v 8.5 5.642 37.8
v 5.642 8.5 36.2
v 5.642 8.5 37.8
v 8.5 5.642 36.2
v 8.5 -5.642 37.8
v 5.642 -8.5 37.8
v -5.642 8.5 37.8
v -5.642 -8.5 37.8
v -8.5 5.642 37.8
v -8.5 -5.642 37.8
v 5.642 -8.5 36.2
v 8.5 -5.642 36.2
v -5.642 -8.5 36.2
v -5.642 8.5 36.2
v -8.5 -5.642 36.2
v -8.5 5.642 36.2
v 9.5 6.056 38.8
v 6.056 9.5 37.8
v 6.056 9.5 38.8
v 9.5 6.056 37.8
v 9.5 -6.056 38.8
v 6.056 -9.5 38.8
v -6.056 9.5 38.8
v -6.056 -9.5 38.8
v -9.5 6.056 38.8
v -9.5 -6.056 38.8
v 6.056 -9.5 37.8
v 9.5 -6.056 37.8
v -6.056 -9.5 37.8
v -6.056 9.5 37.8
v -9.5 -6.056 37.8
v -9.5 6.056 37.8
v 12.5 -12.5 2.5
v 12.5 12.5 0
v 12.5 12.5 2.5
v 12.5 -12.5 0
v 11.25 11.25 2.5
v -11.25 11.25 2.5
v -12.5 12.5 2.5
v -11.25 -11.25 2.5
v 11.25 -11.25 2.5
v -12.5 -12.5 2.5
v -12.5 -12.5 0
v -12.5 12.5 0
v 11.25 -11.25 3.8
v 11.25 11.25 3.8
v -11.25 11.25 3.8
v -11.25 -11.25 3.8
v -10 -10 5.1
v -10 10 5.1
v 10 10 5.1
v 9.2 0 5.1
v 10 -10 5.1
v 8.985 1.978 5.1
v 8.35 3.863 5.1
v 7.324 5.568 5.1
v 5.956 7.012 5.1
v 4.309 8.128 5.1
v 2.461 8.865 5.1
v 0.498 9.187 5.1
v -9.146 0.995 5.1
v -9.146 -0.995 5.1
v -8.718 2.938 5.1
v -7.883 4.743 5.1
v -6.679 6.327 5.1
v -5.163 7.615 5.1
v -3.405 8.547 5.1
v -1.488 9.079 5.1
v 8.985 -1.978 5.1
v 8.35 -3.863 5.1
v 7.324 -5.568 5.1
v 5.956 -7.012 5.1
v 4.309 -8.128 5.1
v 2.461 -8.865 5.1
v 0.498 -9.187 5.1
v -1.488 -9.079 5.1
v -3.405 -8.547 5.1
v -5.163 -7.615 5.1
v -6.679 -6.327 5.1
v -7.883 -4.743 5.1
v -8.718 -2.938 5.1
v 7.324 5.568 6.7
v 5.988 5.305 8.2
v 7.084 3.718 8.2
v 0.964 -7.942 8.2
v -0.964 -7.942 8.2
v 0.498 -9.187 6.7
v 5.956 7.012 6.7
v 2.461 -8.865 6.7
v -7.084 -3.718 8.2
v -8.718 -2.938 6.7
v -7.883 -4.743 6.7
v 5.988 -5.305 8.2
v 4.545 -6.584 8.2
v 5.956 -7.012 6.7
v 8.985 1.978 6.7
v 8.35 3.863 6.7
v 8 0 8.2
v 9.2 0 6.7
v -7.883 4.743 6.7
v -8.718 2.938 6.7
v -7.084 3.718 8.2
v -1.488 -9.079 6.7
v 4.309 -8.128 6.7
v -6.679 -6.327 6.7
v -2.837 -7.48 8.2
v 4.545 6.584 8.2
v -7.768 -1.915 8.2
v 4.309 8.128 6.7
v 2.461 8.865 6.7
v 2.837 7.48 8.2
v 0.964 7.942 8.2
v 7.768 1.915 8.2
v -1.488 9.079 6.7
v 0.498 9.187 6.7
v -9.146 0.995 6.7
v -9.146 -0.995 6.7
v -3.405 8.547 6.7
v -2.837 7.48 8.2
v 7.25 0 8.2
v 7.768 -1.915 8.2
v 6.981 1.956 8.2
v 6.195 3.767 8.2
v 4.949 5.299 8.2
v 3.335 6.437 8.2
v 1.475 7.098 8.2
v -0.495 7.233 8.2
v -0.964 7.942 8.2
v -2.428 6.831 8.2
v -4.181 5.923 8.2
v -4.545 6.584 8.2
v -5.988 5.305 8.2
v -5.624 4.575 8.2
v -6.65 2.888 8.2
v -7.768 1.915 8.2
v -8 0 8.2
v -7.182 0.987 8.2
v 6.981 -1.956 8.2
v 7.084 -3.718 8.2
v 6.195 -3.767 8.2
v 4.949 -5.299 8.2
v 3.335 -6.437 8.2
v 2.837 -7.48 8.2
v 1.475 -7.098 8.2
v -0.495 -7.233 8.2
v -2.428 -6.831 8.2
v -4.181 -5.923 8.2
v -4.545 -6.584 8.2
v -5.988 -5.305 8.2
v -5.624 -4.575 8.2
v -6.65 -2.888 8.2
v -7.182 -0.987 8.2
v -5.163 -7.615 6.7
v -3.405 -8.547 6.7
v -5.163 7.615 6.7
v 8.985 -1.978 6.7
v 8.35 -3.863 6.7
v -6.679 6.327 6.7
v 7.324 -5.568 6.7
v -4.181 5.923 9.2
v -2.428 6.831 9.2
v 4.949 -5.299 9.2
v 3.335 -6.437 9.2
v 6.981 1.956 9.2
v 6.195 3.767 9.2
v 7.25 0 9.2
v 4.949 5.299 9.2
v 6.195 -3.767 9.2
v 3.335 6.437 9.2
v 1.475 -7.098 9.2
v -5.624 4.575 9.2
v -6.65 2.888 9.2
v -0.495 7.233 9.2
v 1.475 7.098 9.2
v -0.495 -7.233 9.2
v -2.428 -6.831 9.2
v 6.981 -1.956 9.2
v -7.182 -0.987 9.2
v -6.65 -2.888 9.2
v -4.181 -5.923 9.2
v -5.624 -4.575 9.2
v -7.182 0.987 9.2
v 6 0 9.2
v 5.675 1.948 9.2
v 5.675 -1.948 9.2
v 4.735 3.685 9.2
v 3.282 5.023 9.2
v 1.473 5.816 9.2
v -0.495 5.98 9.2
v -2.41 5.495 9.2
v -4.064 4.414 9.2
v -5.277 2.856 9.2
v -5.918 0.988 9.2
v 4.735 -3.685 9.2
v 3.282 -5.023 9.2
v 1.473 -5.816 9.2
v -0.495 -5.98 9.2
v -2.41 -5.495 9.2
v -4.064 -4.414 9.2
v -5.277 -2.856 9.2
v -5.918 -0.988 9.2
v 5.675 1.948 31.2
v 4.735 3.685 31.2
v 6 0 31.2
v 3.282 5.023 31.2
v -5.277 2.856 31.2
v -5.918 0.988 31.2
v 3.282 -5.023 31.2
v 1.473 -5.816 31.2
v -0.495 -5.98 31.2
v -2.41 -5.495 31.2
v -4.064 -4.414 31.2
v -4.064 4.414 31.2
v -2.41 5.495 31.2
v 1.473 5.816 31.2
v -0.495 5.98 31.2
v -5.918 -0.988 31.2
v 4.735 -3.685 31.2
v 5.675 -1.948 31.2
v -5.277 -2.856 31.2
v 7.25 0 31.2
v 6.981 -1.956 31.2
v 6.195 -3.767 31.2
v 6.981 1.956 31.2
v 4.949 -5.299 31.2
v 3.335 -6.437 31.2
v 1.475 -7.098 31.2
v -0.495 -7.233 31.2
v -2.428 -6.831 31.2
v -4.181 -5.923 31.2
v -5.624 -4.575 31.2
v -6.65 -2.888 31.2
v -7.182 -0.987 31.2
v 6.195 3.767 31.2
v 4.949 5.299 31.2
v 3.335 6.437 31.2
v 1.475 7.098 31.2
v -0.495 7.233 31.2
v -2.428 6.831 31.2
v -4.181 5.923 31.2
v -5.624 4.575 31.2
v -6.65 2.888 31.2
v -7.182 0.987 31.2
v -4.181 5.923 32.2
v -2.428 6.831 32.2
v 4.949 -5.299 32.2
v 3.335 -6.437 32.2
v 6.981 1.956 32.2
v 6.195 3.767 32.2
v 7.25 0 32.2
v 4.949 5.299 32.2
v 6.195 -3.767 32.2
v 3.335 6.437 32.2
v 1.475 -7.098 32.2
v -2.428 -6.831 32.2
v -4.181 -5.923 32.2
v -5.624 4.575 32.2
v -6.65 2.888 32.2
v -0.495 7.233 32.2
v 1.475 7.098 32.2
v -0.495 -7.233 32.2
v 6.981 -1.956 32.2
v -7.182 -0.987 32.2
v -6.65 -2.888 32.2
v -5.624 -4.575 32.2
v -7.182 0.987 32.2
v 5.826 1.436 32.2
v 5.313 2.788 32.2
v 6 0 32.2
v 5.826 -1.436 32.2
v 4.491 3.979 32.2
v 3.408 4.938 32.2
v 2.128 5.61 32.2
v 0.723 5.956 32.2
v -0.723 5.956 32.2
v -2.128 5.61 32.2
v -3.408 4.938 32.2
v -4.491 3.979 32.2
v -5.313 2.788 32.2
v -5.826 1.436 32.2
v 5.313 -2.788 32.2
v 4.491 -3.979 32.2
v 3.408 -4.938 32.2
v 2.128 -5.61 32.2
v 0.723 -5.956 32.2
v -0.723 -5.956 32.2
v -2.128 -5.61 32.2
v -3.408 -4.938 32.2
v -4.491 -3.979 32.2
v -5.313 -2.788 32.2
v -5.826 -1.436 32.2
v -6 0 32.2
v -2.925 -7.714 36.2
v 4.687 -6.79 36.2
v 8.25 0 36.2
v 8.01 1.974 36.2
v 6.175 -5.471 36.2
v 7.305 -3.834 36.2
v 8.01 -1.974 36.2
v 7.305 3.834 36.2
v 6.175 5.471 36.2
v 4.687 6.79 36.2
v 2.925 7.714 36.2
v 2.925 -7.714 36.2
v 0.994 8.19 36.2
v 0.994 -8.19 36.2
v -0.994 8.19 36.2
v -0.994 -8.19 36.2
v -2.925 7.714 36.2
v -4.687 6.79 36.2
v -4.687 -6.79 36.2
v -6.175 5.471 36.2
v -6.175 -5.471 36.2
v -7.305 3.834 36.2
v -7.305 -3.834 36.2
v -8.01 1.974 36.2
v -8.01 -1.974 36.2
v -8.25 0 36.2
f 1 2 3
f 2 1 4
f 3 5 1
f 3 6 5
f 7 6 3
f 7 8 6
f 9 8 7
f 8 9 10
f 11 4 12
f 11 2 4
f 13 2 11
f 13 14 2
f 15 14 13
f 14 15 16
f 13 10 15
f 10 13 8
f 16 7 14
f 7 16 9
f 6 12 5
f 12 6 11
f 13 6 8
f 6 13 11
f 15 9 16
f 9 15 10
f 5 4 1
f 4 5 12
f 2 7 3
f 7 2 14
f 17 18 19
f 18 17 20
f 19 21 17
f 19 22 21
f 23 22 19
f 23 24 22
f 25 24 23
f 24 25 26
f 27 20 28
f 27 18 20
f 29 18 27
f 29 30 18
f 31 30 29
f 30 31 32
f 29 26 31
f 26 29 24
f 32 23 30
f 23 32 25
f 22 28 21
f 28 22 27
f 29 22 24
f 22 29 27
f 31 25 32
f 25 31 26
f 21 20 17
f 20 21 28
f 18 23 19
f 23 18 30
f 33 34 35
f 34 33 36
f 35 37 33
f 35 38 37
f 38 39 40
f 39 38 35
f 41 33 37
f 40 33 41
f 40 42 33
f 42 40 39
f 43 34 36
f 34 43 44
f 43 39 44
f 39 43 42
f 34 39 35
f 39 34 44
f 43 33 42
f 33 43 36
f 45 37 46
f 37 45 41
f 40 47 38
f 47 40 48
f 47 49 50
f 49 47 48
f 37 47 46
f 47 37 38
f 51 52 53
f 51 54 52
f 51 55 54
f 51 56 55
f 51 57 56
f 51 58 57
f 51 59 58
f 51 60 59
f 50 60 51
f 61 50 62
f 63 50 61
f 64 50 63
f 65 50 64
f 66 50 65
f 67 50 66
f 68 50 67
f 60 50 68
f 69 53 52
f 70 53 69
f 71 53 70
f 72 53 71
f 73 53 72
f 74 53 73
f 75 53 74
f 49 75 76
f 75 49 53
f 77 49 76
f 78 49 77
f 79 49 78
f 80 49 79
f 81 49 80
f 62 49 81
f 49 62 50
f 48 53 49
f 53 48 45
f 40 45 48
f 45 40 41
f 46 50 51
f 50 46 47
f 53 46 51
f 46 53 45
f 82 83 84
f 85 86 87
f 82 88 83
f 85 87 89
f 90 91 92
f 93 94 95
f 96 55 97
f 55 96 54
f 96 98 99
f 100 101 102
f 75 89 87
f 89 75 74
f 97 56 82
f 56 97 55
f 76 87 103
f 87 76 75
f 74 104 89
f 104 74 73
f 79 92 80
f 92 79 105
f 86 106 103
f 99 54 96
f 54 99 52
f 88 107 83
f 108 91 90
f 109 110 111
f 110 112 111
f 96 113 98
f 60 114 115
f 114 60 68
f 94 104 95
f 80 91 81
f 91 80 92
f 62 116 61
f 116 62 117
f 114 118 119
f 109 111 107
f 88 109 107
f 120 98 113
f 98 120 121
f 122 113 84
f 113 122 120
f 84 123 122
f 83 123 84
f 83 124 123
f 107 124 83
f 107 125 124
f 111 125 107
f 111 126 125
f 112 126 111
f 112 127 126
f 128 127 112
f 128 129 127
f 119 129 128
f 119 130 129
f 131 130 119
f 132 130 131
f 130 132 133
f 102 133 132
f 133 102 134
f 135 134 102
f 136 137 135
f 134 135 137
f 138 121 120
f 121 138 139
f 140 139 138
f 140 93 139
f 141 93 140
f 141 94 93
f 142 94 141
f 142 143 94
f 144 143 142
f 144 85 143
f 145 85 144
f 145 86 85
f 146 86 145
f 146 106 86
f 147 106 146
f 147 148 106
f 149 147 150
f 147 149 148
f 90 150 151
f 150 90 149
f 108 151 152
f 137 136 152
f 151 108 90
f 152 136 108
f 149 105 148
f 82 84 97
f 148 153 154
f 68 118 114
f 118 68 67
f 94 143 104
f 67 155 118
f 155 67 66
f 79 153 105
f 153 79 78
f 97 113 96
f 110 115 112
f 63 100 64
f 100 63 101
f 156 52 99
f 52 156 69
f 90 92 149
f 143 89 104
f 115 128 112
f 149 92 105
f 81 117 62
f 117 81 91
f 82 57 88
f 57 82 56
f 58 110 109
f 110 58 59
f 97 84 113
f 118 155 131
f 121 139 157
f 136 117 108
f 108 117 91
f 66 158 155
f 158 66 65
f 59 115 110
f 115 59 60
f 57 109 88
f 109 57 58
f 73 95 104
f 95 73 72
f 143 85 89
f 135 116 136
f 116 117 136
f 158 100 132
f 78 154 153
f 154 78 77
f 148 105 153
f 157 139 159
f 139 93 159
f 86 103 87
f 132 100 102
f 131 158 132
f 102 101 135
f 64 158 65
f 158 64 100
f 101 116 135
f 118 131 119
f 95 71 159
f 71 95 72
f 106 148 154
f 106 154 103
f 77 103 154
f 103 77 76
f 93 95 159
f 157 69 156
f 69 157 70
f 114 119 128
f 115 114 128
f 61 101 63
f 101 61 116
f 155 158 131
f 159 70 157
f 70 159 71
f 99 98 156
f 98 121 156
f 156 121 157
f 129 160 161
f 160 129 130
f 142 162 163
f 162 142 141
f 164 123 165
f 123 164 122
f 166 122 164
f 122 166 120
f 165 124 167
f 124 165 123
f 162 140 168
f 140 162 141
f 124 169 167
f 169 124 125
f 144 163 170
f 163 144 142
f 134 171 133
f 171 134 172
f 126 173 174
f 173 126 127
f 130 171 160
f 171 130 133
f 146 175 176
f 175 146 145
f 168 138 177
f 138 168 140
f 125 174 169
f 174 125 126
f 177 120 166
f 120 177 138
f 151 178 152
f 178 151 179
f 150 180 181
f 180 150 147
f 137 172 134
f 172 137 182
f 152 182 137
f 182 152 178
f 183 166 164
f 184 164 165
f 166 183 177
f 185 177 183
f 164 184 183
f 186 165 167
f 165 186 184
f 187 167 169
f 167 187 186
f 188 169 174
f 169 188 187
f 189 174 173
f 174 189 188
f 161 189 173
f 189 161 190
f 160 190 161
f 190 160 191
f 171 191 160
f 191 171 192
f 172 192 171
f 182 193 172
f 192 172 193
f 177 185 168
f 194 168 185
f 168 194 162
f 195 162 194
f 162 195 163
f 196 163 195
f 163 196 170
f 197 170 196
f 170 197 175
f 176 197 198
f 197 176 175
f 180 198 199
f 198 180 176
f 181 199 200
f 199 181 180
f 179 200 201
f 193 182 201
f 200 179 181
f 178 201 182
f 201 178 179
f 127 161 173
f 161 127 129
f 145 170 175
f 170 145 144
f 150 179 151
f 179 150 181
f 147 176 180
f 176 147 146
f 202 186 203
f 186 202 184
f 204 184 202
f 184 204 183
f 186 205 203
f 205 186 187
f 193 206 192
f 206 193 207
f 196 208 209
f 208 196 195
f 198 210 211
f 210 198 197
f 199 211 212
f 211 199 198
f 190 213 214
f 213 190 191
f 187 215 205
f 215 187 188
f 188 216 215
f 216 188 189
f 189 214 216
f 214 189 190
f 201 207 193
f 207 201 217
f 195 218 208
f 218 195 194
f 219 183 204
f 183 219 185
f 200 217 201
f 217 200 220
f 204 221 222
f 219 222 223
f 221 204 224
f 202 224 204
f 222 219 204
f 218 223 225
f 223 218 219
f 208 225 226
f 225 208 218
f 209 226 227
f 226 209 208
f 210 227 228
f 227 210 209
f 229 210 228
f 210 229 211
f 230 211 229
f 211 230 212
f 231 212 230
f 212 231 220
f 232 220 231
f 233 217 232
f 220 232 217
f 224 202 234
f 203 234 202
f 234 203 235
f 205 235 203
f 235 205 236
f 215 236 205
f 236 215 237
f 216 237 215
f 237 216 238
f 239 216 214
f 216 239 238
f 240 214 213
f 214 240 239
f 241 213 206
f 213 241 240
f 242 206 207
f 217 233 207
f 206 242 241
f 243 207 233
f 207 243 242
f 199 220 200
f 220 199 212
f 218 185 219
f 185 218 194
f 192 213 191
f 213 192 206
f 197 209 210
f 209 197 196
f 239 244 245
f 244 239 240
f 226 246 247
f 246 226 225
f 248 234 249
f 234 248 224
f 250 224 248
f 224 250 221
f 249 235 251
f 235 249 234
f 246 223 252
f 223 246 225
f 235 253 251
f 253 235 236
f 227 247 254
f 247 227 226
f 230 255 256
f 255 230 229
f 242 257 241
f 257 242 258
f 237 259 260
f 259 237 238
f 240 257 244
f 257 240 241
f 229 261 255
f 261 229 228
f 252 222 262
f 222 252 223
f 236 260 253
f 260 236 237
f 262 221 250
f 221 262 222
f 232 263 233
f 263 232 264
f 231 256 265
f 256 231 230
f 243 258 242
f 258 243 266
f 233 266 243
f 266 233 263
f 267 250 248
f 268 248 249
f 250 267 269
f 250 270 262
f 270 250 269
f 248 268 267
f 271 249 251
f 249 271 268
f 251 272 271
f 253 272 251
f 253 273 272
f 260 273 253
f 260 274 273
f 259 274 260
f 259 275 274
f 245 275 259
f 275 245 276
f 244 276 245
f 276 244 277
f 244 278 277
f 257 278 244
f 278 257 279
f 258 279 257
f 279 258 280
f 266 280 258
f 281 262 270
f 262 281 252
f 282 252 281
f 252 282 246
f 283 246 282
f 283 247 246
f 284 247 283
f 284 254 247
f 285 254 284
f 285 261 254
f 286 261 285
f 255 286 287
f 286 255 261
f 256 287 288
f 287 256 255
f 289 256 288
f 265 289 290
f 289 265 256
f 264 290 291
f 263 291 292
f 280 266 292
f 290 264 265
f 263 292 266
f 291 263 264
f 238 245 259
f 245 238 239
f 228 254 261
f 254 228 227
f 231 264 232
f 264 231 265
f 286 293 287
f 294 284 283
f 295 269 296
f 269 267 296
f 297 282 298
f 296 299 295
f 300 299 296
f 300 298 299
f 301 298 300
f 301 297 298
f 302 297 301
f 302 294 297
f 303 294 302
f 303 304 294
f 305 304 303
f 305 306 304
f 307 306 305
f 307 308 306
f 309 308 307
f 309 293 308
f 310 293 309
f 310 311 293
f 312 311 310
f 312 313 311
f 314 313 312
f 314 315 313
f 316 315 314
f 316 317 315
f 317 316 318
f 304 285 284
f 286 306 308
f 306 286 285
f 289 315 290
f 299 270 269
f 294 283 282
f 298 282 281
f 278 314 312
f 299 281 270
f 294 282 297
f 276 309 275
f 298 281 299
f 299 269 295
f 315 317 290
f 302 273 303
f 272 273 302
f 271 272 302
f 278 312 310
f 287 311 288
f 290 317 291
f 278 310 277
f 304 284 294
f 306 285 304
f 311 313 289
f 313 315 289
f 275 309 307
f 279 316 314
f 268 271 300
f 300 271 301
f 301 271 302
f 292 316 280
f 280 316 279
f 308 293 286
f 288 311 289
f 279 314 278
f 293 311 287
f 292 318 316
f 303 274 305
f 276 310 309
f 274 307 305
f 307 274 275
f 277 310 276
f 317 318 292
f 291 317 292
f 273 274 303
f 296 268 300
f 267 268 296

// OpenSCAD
union() {
  translate([-12.5, -12.5, 0]) cube([25,25,2.5]);
  hull() {
    translate([-11.25, -11.25, 2.5]) cube([22.5, 22.5, 1.3]);
    translate([-10, -10, 3.8]) cube([20, 20, 1.3]);
  }
  hull() {
    translate([0,0,5.1]) cylinder(1.6,9.2,9.2);
    translate([0,0,6.7]) cylinder(1.5,8,8); // 8.2
  }

  translate([0,0,8.2]) cylinder(1,7.25,7.25);
  translate([0,0,9.2]) cylinder(22,6,6);
  translate([0,0,31.2]) cylinder(1,7.25,7.25);
  translate([0,0,32.2]) cylinder(4,6,8.25); //36.2
  rotate([0,0,45]) union() {
    translate([-10,-10,36.2]) intersection() {
      cube([20, 20, 1.6]);
      translate([10,-24.04163056/2+10,0]) rotate([0,0,45]) cube([17,17,1.6]);  
    }
    translate([-11,-11,37.8]) intersection() {
      cube([22, 22, 1]);
      translate([11,-26.870057685/2+11,0]) rotate([0,0,45]) cube([19,19,1]);  
    }
  }
} //total 38.8
